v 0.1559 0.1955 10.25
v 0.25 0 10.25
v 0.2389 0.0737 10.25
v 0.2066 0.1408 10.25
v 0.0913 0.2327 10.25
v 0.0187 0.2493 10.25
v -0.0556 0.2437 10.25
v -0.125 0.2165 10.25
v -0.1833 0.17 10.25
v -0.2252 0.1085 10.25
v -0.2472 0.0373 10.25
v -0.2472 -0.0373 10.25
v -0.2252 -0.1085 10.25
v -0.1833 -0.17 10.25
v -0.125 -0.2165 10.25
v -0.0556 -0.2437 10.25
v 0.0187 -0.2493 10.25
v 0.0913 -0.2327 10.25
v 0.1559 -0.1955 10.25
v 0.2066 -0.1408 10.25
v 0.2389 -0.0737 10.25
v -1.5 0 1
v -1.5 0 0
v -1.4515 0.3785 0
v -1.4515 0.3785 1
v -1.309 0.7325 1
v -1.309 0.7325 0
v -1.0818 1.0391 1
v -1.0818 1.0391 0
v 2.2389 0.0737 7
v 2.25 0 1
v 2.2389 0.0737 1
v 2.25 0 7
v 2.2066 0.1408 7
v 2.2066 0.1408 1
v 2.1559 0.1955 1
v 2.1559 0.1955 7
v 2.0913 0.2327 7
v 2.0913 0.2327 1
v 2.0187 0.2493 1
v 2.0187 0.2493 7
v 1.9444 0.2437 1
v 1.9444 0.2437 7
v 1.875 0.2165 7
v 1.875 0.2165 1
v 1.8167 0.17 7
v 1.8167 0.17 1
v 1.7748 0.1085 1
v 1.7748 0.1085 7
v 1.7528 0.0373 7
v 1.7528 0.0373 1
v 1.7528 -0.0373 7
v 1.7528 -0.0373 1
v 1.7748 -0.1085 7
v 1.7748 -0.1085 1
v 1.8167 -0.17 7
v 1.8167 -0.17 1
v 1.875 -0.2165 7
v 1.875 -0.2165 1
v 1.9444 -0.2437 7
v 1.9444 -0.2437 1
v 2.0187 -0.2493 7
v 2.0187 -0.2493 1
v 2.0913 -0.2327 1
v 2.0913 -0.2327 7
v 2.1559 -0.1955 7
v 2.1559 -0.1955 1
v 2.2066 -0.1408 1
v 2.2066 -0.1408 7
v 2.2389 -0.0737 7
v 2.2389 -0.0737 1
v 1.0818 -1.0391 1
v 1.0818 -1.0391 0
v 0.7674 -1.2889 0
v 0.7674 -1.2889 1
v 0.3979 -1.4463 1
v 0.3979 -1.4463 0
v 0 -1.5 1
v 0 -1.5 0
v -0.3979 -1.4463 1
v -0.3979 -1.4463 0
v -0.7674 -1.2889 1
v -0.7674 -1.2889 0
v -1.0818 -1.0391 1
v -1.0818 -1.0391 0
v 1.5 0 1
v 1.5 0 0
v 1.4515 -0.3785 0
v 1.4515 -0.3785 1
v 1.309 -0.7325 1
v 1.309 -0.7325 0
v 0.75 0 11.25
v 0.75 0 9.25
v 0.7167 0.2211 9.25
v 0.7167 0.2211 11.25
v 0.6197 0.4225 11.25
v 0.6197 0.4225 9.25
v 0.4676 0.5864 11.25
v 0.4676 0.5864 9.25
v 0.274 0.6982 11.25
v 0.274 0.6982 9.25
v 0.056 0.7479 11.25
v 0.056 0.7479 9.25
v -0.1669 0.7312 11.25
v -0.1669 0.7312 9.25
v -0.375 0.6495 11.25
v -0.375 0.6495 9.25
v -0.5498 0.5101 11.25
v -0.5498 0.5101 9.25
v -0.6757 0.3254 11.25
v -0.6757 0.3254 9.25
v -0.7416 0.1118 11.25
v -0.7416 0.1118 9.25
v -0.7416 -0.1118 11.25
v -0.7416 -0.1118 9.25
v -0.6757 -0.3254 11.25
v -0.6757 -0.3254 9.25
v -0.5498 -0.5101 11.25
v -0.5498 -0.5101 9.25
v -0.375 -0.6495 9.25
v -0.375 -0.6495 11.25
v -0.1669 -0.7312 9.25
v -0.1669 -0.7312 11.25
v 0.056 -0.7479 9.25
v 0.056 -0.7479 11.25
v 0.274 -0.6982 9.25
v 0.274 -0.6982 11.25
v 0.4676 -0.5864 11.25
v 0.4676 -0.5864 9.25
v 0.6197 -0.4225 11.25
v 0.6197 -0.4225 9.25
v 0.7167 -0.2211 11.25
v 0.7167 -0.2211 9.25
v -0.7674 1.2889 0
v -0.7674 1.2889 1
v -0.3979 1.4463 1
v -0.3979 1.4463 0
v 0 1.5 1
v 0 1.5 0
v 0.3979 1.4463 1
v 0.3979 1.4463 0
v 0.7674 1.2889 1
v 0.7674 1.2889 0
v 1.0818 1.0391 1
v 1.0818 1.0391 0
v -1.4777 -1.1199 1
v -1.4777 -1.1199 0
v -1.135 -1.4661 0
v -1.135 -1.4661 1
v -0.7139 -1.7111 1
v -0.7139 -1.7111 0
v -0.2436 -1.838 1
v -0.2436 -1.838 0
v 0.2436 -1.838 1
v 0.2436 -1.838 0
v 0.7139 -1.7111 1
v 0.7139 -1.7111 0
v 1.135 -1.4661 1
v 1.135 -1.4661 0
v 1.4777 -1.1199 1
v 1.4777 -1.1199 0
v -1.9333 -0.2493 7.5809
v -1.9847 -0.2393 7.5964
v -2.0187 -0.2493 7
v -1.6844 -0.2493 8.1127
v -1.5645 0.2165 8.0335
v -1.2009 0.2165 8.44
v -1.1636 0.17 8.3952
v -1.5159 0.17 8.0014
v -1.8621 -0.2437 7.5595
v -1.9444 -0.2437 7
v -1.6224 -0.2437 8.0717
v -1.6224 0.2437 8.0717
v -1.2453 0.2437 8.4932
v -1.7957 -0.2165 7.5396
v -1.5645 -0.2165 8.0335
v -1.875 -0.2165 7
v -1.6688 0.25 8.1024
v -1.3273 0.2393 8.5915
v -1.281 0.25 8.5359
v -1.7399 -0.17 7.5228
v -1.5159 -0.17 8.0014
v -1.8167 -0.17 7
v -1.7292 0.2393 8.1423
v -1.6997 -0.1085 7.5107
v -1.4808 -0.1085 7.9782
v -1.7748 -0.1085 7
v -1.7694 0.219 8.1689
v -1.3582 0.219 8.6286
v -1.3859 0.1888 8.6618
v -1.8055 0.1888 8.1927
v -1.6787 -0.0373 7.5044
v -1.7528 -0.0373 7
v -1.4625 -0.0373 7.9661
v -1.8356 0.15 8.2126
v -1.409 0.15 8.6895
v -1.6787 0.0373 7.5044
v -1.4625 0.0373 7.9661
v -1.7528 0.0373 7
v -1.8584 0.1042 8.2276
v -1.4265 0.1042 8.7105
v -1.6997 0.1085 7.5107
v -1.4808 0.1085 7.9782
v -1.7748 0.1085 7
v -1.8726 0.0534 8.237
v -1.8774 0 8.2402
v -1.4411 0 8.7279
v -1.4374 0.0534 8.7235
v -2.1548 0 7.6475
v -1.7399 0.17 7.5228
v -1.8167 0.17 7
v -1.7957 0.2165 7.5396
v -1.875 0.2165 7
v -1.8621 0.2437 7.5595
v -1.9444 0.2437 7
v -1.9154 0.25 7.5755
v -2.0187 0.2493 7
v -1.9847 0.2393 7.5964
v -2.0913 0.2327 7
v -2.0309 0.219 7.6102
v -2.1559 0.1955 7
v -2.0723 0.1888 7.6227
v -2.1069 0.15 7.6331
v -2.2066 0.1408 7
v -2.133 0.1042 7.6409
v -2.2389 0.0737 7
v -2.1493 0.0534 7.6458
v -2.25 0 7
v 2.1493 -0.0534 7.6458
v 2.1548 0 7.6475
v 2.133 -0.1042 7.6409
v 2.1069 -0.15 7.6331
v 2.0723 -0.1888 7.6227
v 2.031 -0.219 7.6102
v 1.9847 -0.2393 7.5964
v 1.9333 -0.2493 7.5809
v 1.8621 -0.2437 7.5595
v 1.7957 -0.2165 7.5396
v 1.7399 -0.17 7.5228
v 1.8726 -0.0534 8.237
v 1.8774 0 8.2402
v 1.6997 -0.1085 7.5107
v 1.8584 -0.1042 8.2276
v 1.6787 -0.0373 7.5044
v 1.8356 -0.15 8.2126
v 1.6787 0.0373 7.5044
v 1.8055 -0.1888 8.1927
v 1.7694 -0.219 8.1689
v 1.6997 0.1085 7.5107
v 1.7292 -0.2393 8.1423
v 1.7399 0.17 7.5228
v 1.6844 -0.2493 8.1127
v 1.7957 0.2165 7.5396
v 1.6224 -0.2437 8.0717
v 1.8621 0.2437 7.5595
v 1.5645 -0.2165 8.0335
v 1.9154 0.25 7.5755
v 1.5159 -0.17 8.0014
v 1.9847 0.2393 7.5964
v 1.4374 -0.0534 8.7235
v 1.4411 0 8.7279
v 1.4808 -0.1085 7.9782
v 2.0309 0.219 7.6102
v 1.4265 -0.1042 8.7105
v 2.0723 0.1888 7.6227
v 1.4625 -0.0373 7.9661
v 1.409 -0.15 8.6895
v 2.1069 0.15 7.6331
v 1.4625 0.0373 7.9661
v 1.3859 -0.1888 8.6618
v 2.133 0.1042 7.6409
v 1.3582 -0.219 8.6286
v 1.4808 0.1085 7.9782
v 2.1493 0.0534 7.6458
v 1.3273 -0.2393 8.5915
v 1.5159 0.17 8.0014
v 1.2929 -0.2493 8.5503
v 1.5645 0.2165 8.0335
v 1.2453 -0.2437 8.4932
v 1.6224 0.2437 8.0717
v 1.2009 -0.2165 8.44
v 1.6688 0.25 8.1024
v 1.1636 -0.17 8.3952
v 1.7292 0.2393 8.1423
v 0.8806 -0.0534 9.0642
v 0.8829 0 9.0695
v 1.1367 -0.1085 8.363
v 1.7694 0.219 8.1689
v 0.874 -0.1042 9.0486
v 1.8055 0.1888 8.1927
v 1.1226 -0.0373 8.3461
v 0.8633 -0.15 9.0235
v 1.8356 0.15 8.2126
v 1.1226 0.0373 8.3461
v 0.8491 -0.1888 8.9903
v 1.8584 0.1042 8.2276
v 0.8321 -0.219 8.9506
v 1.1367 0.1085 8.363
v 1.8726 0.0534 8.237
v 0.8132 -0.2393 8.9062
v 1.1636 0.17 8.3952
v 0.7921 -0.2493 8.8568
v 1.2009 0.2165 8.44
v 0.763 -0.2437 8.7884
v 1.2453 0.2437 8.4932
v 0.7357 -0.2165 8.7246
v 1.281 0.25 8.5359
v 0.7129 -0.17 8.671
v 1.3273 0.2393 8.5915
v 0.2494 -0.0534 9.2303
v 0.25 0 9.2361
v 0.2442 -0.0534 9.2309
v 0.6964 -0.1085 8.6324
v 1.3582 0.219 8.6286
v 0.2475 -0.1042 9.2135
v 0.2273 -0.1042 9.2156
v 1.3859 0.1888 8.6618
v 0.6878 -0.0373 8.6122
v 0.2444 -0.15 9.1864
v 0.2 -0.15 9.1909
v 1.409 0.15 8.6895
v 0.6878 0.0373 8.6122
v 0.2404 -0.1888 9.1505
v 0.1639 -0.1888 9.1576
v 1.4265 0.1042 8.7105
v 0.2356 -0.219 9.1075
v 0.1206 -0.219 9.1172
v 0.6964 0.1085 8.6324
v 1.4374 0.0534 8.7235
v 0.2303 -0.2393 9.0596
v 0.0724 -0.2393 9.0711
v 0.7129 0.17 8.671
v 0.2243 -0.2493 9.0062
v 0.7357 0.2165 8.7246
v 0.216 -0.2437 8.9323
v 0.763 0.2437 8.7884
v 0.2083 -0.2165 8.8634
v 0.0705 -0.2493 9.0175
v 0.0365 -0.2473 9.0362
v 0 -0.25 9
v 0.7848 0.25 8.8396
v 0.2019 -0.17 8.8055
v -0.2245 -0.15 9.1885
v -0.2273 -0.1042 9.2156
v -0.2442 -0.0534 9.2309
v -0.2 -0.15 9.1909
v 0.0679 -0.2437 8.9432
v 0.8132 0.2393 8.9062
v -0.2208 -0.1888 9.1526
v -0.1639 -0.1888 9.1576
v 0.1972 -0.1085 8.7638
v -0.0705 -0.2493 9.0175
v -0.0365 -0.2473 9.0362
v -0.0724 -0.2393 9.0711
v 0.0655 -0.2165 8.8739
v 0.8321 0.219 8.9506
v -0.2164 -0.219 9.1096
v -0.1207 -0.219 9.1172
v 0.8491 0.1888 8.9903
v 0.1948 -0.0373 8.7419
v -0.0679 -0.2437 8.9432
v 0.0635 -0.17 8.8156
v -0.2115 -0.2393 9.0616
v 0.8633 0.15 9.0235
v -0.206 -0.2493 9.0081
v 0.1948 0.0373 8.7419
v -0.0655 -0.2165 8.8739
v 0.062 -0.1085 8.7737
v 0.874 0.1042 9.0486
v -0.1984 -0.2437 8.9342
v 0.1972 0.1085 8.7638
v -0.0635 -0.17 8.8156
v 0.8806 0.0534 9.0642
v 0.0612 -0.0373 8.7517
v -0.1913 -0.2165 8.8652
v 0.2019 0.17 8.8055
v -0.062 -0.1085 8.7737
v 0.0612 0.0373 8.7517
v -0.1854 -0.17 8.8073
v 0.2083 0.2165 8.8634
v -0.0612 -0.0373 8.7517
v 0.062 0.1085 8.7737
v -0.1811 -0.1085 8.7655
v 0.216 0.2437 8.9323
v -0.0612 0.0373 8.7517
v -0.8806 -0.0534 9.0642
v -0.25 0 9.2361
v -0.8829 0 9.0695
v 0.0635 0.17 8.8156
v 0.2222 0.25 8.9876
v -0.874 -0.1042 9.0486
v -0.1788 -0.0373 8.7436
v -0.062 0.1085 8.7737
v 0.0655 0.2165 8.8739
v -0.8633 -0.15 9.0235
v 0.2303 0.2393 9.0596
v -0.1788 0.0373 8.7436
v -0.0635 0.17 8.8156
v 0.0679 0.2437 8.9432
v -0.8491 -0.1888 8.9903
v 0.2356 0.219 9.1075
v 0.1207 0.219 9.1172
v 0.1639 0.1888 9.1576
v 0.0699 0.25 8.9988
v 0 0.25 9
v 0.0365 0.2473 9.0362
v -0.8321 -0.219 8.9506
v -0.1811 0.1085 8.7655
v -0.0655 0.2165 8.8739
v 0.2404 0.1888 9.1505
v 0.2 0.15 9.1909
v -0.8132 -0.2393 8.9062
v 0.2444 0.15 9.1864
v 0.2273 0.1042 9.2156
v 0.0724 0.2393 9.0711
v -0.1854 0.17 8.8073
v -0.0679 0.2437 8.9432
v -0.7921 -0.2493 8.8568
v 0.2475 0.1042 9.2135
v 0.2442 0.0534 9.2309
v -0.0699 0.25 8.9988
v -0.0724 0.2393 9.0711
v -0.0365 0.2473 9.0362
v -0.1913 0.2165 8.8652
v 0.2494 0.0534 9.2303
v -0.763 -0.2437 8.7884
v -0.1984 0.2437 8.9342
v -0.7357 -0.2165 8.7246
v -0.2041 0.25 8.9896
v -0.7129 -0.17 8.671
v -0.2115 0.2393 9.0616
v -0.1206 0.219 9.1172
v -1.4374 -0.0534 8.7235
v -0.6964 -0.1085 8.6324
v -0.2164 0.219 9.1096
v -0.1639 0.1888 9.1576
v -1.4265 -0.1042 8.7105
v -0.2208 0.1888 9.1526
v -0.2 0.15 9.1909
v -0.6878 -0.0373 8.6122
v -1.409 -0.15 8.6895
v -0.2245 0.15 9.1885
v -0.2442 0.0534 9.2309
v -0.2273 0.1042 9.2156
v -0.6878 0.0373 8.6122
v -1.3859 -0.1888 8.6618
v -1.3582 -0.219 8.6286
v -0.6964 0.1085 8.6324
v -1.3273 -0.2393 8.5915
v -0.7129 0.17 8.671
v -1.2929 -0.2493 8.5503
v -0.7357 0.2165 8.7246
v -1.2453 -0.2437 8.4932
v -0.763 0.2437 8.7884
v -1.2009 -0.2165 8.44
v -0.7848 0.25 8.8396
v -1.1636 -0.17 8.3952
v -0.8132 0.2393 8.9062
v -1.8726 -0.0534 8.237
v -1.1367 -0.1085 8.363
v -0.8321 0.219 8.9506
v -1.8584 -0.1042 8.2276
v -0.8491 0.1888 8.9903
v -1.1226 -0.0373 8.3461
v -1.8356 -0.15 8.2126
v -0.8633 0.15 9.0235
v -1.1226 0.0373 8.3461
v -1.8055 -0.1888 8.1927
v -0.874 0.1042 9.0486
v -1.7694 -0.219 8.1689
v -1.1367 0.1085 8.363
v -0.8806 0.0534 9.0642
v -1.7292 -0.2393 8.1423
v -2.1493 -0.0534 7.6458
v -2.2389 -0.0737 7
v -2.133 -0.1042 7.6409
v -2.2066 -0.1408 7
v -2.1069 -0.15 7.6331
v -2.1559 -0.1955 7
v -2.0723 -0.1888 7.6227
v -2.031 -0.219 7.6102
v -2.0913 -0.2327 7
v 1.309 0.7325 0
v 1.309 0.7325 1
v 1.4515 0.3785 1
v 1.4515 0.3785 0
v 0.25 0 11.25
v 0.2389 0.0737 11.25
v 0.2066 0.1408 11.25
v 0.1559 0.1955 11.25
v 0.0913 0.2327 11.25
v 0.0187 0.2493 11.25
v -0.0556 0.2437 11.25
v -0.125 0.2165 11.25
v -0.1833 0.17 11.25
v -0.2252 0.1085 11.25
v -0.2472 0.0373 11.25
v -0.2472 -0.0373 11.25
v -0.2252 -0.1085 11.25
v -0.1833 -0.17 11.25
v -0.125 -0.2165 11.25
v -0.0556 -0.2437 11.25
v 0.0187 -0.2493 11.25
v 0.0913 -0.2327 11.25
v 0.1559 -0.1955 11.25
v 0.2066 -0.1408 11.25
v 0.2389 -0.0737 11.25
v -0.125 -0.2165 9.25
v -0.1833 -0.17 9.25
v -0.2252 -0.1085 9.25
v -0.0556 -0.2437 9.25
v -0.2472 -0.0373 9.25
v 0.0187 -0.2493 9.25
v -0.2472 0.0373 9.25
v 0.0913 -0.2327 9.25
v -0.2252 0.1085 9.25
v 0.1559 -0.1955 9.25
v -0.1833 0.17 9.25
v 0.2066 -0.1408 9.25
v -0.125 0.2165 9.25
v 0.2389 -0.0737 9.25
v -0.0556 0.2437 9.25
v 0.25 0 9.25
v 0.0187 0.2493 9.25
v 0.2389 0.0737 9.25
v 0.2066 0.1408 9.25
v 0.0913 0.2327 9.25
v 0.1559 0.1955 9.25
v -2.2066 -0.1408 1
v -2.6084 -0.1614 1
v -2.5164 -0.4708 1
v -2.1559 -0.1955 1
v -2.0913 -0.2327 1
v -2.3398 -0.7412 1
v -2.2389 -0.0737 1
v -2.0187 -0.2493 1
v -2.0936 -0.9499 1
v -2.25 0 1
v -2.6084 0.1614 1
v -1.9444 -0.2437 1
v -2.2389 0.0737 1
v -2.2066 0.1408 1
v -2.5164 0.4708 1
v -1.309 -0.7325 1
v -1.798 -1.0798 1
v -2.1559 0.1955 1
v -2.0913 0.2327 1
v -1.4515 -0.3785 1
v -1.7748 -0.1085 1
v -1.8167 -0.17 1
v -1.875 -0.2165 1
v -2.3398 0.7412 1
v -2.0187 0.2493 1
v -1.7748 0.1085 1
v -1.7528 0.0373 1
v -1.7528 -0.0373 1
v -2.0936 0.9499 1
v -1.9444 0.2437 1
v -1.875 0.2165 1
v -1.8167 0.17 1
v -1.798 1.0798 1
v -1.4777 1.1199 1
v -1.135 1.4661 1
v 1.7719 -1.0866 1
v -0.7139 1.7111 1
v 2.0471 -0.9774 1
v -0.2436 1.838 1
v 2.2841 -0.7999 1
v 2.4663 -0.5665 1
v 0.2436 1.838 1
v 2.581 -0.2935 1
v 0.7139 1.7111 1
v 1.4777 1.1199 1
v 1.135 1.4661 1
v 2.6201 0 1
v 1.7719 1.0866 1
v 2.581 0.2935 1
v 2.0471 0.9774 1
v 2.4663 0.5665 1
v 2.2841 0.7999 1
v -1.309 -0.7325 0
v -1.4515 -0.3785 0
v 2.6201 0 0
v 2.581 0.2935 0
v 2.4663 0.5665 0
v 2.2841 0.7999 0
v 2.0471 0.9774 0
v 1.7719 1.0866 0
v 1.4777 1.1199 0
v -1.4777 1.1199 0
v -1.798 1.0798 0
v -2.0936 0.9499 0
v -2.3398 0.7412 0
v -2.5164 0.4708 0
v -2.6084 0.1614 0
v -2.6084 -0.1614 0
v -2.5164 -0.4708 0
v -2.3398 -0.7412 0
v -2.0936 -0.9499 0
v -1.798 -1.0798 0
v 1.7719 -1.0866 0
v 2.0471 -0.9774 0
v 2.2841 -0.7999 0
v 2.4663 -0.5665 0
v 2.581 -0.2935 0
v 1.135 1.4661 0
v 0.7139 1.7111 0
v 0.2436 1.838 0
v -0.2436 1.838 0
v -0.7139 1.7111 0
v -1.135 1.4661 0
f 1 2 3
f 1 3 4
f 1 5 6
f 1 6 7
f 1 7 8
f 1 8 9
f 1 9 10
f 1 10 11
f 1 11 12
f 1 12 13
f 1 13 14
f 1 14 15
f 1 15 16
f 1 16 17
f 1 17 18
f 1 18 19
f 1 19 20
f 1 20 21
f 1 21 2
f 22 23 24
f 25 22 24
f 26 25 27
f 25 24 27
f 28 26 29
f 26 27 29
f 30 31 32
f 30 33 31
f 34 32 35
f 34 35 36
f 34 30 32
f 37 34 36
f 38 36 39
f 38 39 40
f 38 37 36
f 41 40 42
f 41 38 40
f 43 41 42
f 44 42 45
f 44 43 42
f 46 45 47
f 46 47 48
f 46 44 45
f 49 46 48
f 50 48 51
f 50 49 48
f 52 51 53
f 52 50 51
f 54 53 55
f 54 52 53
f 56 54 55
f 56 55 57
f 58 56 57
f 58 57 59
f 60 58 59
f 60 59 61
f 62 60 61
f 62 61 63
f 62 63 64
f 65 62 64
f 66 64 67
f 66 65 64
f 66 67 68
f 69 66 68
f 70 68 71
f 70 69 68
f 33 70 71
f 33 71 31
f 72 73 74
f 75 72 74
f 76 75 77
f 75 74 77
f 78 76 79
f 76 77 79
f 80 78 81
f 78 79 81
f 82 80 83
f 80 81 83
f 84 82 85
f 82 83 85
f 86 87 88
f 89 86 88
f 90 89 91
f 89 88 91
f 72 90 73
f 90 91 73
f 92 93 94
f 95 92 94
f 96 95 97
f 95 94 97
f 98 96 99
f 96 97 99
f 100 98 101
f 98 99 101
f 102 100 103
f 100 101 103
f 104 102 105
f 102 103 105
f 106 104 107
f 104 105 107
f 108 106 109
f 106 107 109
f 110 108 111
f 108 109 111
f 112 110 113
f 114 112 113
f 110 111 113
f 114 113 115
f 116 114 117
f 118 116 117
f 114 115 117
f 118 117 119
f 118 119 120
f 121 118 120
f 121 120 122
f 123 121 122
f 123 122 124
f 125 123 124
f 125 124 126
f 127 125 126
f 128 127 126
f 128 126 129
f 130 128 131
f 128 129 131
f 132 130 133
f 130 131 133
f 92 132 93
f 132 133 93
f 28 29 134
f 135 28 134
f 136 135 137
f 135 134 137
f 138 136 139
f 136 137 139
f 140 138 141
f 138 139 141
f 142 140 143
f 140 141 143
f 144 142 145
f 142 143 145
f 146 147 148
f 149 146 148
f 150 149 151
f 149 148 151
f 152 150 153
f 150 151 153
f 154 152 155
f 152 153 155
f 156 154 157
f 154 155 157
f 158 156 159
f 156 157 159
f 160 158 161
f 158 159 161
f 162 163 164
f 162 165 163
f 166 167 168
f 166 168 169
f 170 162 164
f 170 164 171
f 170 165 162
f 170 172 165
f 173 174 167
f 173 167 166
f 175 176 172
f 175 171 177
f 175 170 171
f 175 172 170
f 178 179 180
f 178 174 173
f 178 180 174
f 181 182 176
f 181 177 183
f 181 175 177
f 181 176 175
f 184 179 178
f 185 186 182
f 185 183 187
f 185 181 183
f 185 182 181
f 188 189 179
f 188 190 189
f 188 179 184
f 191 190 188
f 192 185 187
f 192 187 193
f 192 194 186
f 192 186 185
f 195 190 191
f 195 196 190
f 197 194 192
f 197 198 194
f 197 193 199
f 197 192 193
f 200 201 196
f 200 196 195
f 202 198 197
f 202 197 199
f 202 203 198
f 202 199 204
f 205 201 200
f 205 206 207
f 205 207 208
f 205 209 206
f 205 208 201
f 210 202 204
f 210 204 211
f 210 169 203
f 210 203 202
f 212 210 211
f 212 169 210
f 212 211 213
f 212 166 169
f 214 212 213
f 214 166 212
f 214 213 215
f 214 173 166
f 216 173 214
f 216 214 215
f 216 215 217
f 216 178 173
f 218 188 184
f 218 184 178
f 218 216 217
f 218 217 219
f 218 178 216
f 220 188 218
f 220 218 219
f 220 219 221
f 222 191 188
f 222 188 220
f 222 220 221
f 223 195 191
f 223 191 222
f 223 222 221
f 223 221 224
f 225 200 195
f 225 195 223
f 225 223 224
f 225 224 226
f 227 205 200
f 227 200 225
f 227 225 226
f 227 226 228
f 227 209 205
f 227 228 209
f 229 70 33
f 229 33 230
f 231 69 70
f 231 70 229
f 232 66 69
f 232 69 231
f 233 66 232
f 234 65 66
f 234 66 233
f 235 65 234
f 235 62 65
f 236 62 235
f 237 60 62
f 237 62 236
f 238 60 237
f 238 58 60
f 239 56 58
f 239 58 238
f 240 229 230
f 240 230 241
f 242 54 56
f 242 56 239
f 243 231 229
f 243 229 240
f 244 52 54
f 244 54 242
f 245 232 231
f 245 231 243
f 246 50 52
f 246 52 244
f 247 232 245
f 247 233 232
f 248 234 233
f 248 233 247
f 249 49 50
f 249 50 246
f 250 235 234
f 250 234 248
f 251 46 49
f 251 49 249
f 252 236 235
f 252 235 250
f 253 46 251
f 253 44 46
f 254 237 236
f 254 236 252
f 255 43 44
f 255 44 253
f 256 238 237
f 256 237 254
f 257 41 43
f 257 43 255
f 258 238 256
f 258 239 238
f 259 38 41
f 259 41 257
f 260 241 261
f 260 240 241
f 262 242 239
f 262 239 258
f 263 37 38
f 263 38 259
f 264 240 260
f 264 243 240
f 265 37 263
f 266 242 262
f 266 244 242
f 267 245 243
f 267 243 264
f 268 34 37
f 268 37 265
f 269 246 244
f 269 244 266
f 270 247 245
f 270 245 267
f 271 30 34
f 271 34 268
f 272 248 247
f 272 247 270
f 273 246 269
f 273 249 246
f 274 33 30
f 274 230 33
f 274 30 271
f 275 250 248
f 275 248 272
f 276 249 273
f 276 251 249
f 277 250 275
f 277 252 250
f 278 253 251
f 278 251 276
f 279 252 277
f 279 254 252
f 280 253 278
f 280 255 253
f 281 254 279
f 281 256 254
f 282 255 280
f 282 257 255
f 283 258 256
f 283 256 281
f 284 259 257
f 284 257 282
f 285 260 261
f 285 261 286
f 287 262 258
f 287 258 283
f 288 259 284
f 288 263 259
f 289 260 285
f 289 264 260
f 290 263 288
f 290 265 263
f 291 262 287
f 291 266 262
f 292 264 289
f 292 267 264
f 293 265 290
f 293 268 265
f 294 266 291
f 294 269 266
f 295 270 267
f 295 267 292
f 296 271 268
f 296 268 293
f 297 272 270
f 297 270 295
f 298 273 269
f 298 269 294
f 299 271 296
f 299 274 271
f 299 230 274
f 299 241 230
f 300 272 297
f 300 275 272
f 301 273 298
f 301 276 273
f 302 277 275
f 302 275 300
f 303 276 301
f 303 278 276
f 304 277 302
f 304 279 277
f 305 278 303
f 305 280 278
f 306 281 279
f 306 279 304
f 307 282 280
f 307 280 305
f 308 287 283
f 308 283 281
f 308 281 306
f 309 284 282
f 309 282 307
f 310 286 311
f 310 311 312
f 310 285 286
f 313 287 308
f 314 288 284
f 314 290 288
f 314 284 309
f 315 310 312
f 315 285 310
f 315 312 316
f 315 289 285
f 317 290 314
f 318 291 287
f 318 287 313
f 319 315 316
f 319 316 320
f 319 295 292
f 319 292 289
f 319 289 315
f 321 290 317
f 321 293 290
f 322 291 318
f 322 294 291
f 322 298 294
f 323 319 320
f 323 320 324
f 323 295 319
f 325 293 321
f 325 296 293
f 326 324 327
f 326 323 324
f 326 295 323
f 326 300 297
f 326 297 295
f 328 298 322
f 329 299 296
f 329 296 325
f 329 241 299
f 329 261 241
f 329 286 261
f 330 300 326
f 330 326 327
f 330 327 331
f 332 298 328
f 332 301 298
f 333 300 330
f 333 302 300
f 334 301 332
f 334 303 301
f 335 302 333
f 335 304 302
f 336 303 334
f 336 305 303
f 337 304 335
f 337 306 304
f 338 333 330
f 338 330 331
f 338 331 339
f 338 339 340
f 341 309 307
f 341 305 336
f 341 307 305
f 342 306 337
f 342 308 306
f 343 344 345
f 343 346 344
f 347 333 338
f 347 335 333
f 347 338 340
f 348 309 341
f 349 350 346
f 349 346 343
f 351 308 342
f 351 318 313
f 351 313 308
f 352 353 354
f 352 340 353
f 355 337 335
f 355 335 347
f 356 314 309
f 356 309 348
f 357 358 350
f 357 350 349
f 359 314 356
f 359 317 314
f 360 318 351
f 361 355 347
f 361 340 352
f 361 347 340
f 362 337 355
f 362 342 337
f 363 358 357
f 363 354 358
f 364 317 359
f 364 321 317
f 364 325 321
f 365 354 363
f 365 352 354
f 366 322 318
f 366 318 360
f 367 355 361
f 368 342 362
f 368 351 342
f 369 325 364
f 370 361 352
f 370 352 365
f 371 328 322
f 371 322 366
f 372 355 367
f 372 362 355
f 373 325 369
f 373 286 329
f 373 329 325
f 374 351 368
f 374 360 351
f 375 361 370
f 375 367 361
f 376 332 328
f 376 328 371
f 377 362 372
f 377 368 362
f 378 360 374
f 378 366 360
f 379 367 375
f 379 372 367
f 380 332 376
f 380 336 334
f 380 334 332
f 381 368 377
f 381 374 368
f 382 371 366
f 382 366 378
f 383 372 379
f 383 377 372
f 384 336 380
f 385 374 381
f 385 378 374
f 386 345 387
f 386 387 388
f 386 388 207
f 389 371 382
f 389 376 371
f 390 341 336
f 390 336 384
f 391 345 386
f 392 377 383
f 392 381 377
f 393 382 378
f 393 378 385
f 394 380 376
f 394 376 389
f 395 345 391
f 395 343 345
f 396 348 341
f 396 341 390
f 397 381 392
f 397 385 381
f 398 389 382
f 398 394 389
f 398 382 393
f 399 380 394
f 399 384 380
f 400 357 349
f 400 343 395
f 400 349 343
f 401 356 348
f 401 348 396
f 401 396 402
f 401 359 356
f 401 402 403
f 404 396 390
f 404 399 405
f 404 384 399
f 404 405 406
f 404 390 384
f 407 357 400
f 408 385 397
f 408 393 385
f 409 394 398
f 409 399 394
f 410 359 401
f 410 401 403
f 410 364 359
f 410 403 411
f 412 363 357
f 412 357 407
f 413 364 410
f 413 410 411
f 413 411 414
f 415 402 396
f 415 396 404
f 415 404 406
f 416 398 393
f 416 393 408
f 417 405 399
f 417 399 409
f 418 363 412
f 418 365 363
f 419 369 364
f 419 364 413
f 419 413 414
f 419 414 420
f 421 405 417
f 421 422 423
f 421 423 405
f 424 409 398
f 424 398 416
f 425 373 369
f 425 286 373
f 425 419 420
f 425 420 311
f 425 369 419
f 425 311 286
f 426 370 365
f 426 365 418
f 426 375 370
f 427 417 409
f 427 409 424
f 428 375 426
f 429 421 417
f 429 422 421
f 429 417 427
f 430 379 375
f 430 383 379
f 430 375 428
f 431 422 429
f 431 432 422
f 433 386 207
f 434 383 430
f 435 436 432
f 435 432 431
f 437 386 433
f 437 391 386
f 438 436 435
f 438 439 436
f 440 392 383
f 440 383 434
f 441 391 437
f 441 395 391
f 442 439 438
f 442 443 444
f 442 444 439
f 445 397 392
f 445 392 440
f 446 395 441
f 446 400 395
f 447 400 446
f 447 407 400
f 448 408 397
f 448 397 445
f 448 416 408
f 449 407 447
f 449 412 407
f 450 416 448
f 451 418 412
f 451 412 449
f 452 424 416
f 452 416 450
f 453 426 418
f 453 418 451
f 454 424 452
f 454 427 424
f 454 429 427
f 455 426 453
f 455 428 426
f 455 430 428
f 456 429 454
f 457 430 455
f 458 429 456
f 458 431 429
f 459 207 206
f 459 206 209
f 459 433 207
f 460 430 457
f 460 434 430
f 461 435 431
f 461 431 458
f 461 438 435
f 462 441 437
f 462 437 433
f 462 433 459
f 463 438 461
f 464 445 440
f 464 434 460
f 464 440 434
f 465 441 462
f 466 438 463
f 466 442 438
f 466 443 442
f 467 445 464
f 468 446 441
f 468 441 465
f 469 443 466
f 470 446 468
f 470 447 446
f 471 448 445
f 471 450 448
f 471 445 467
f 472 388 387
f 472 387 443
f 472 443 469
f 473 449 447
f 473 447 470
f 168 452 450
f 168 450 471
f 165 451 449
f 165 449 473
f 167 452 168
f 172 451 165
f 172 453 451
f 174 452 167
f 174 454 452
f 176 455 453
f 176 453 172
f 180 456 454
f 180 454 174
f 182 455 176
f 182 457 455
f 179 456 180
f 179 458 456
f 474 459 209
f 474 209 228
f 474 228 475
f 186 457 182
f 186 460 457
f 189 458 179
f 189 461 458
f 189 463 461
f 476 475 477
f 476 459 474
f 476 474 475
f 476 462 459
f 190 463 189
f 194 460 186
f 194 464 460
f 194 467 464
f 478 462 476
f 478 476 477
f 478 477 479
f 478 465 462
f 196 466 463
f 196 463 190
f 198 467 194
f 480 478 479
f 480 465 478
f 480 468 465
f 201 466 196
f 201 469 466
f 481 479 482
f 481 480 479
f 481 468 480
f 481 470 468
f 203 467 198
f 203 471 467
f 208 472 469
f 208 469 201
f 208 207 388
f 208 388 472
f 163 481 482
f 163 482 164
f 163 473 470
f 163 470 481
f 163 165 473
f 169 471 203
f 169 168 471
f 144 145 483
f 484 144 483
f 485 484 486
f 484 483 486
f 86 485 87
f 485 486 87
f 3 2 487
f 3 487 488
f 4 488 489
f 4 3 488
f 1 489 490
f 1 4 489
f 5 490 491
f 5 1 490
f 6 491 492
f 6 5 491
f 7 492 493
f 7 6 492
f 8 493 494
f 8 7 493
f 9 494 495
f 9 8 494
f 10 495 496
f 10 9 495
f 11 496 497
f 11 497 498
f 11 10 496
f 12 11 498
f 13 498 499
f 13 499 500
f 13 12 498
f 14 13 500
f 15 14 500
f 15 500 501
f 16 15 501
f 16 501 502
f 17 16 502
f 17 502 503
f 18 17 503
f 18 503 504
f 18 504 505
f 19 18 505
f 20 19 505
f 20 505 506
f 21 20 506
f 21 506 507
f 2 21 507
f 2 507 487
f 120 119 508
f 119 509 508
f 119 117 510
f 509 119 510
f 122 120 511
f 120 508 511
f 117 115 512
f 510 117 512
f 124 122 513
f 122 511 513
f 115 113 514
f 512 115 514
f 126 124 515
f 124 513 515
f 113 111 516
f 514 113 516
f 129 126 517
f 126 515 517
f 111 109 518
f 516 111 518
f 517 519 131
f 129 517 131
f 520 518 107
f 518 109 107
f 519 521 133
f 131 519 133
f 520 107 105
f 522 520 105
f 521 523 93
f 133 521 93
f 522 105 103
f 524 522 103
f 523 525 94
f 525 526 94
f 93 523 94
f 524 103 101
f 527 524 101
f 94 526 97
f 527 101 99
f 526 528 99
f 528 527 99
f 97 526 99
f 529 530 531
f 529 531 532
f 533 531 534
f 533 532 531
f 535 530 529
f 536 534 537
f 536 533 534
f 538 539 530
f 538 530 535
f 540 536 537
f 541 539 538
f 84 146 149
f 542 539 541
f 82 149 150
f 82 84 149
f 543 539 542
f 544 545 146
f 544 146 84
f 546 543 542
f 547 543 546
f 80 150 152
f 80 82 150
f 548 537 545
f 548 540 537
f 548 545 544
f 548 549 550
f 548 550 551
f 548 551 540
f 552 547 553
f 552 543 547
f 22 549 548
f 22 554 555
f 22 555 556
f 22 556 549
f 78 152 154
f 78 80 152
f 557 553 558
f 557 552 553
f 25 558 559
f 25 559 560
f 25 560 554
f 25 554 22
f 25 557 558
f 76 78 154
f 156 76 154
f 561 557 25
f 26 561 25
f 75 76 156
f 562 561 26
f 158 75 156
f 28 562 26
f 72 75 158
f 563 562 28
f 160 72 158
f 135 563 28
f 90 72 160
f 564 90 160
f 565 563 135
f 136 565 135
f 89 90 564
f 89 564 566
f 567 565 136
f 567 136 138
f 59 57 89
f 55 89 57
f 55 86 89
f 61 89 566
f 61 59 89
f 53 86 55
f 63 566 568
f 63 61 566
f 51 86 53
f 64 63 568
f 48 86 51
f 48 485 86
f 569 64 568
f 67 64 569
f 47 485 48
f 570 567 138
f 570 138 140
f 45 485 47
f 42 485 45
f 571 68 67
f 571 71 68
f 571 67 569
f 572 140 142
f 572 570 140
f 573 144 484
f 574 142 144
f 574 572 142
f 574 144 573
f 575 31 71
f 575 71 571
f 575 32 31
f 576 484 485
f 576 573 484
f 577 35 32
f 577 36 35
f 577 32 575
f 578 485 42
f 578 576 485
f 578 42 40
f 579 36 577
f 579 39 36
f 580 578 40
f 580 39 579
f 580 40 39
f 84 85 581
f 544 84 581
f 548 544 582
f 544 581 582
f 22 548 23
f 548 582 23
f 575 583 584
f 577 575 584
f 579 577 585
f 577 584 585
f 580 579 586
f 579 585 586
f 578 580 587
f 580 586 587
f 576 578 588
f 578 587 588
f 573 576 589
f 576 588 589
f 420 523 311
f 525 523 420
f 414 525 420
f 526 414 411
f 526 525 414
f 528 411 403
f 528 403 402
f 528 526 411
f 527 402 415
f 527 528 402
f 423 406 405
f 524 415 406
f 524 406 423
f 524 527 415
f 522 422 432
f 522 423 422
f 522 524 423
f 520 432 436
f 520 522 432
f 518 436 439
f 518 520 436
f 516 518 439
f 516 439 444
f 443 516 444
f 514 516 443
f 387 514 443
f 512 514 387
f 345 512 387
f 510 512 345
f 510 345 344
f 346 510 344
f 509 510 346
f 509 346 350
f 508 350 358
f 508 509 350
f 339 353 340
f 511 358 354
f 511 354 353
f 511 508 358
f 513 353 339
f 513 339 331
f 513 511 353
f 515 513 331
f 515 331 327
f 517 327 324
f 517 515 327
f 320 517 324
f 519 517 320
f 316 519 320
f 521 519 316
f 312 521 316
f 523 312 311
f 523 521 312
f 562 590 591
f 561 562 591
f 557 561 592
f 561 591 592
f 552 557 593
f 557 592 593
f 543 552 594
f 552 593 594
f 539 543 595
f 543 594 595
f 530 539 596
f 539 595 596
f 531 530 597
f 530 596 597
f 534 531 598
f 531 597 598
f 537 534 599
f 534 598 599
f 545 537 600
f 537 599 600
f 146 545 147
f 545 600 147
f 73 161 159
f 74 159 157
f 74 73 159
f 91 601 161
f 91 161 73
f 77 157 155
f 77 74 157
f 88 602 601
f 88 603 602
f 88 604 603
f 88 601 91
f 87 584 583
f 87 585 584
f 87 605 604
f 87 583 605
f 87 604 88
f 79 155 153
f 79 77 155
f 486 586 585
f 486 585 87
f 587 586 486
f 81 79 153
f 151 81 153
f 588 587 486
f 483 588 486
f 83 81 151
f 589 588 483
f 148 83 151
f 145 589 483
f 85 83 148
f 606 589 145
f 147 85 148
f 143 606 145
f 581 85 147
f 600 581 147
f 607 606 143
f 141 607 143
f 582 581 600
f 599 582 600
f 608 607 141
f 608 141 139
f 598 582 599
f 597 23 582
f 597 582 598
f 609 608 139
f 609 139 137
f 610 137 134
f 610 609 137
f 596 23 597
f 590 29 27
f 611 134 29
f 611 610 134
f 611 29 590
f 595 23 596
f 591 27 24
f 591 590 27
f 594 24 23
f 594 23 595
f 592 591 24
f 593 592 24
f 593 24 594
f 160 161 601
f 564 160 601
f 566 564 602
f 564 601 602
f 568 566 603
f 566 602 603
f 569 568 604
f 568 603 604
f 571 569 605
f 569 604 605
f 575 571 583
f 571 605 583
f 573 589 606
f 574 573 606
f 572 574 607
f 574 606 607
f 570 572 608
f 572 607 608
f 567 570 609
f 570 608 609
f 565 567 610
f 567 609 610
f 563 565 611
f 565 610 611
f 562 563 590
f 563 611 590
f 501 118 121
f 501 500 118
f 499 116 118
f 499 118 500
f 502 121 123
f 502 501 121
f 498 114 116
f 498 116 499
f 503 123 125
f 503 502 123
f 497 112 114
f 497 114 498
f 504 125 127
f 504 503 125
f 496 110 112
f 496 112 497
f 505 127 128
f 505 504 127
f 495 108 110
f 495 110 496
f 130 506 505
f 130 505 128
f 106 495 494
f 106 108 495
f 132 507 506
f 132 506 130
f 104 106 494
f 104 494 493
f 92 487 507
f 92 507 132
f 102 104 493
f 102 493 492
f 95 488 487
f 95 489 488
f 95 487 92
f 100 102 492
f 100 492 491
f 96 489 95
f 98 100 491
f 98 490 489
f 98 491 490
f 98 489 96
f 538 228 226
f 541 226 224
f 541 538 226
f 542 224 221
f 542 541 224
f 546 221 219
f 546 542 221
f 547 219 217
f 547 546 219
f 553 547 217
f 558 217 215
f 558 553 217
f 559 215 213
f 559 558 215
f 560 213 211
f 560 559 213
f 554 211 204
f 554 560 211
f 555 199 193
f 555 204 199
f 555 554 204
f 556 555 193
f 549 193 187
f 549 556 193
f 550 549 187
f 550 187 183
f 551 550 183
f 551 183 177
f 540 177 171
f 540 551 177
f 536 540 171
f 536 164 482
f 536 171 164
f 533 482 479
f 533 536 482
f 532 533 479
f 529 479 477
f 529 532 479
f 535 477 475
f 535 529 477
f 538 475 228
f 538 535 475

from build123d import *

# Parameters (mm, degrees)
F1_DEPTH      = 1
F3_R          = 0.25
F6_R          = 0.25
F7_DEPTH      = 1
F7_DEPTH_BACK = 0.25
F6_R_2        = 0.75
F8_DEPTH      = 2


with BuildPart() as f1:
    # F0 (on Top) → F1 (new body)
    with BuildSketch(Plane.XY):
        with BuildLine():
            ThreePointArc((-1.5, 0), (-1.3915219316, 0.5600595628), (-1.0817777148, 1.0391135529))
            ThreePointArc((-1.0817777148, 1.0391135529), (-1.2760507608, 1.0975033458), (-1.4776690405, 1.1198965059))
            ThreePointArc((-1.4776690405, 1.1198965059), (-1.7574719103, 0.590733833), (-1.8540965393, 0))
            Line((-1.8540965393, 0), (-1.5, 0))
        make_face()
        with BuildLine():
            ThreePointArc((-1.8540965393, 0), (-1.7574719103, 0.590733833), (-1.4776690405, 1.1198965059))
            ThreePointArc((-1.4776690405, 1.1198965059), (-2.6201191257, 0), (-1.4776690405, -1.1198965059))
            ThreePointArc((-1.4776690405, -1.1198965059), (-1.7574719103, -0.590733833), (-1.8540965393, 0))
        make_face()
        with BuildLine():
            ThreePointArc((-1.4776690405, -1.1198965059), (-1.2760507608, -1.0975033458), (-1.0817777148, -1.0391135529))
            ThreePointArc((-1.0817777148, -1.0391135529), (-1.3915219316, -0.5600595628), (-1.5, 0))
            Line((-1.5, 0), (-1.8540965393, 0))
            ThreePointArc((-1.8540965393, 0), (-1.7574719103, -0.590733833), (-1.4776690405, -1.1198965059))
        make_face()
        with BuildLine():
            ThreePointArc((1.4776690405, -1.1198965059), (1.2760507608, -1.0975033458), (1.0817777148, -1.0391135529))
            ThreePointArc((1.0817777148, -1.0391135529), (0, -1.5), (-1.0817777148, -1.0391135529))
            ThreePointArc((-1.0817777148, -1.0391135529), (-1.2760507608, -1.0975033458), (-1.4776690405, -1.1198965059))
            ThreePointArc((-1.4776690405, -1.1198965059), (0, -1.8540965393), (1.4776690405, -1.1198965059))
        make_face()
        with BuildLine():
            ThreePointArc((-1.0817777148, 1.0391135529), (0, 1.5), (1.0817777148, 1.0391135529))
            ThreePointArc((1.0817777148, 1.0391135529), (1.2760507608, 1.0975033458), (1.4776690405, 1.1198965059))
            ThreePointArc((1.4776690405, 1.1198965059), (0, 1.8540965393), (-1.4776690405, 1.1198965059))
            ThreePointArc((-1.4776690405, 1.1198965059), (-1.2760507608, 1.0975033458), (-1.0817777148, 1.0391135529))
        make_face()
        with BuildLine():
            ThreePointArc((2.6201191257, 0), (2.2841088958, 0.7999000533), (1.4776690405, 1.1198965059))
            ThreePointArc((1.4776690405, 1.1198965059), (1.7574719103, 0.590733833), (1.8540965393, 0))
            ThreePointArc((1.8540965393, 0), (1.7574719103, -0.590733833), (1.4776690405, -1.1198965059))
            ThreePointArc((1.4776690405, -1.1198965059), (2.2841088958, -0.7999000533), (2.6201191257, 0))
        make_face()
        with BuildLine():
            ThreePointArc((1.0817777148, 1.0391135529), (1.3915219316, 0.5600595628), (1.5, 0))
            ThreePointArc((1.5, 0), (1.3915219316, -0.5600595628), (1.0817777148, -1.0391135529))
            ThreePointArc((1.0817777148, -1.0391135529), (1.2760507608, -1.0975033458), (1.4776690405, -1.1198965059))
            ThreePointArc((1.4776690405, -1.1198965059), (1.7574719103, -0.590733833), (1.8540965393, 0))
            ThreePointArc((1.8540965393, 0), (1.7574719103, 0.590733833), (1.4776690405, 1.1198965059))
            ThreePointArc((1.4776690405, 1.1198965059), (1.2760507608, 1.0975033458), (1.0817777148, 1.0391135529))
        make_face()
    extrude(amount=F1_DEPTH)

    # F4: sweep along a path in F2
    with BuildLine(Plane.XZ) as f4_path:
        Line((2, 0), (2, 7))
        ThreePointArc((2, 7), (0, 9), (-2, 7))
        Line((-2, 7), (-2, 0))
    # F3 (on face) → F4 (sweep)
    with BuildSketch(Plane(origin=(0, 0, 0), x_dir=(1, 0, 0), z_dir=(0, 0, -1))):
        with Locations((2, 0)):
            Circle(F3_R)
    sweep(path=f4_path.line)

    # F6 (on offset) → F7 (join, two sides)
    with BuildSketch(Plane.XY.offset(9.25)) as f7_sk:
        Circle(F6_R)
    extrude(amount=F7_DEPTH)
    extrude(f7_sk.sketch, amount=-F7_DEPTH_BACK)

    # F6 (on offset) → F8 (join)
    with BuildSketch(Plane.XY.offset(9.25)):
        Circle(F6_R_2)
        Circle(F6_R, mode=Mode.SUBTRACT)
    extrude(amount=F8_DEPTH)


solid = f1.part
